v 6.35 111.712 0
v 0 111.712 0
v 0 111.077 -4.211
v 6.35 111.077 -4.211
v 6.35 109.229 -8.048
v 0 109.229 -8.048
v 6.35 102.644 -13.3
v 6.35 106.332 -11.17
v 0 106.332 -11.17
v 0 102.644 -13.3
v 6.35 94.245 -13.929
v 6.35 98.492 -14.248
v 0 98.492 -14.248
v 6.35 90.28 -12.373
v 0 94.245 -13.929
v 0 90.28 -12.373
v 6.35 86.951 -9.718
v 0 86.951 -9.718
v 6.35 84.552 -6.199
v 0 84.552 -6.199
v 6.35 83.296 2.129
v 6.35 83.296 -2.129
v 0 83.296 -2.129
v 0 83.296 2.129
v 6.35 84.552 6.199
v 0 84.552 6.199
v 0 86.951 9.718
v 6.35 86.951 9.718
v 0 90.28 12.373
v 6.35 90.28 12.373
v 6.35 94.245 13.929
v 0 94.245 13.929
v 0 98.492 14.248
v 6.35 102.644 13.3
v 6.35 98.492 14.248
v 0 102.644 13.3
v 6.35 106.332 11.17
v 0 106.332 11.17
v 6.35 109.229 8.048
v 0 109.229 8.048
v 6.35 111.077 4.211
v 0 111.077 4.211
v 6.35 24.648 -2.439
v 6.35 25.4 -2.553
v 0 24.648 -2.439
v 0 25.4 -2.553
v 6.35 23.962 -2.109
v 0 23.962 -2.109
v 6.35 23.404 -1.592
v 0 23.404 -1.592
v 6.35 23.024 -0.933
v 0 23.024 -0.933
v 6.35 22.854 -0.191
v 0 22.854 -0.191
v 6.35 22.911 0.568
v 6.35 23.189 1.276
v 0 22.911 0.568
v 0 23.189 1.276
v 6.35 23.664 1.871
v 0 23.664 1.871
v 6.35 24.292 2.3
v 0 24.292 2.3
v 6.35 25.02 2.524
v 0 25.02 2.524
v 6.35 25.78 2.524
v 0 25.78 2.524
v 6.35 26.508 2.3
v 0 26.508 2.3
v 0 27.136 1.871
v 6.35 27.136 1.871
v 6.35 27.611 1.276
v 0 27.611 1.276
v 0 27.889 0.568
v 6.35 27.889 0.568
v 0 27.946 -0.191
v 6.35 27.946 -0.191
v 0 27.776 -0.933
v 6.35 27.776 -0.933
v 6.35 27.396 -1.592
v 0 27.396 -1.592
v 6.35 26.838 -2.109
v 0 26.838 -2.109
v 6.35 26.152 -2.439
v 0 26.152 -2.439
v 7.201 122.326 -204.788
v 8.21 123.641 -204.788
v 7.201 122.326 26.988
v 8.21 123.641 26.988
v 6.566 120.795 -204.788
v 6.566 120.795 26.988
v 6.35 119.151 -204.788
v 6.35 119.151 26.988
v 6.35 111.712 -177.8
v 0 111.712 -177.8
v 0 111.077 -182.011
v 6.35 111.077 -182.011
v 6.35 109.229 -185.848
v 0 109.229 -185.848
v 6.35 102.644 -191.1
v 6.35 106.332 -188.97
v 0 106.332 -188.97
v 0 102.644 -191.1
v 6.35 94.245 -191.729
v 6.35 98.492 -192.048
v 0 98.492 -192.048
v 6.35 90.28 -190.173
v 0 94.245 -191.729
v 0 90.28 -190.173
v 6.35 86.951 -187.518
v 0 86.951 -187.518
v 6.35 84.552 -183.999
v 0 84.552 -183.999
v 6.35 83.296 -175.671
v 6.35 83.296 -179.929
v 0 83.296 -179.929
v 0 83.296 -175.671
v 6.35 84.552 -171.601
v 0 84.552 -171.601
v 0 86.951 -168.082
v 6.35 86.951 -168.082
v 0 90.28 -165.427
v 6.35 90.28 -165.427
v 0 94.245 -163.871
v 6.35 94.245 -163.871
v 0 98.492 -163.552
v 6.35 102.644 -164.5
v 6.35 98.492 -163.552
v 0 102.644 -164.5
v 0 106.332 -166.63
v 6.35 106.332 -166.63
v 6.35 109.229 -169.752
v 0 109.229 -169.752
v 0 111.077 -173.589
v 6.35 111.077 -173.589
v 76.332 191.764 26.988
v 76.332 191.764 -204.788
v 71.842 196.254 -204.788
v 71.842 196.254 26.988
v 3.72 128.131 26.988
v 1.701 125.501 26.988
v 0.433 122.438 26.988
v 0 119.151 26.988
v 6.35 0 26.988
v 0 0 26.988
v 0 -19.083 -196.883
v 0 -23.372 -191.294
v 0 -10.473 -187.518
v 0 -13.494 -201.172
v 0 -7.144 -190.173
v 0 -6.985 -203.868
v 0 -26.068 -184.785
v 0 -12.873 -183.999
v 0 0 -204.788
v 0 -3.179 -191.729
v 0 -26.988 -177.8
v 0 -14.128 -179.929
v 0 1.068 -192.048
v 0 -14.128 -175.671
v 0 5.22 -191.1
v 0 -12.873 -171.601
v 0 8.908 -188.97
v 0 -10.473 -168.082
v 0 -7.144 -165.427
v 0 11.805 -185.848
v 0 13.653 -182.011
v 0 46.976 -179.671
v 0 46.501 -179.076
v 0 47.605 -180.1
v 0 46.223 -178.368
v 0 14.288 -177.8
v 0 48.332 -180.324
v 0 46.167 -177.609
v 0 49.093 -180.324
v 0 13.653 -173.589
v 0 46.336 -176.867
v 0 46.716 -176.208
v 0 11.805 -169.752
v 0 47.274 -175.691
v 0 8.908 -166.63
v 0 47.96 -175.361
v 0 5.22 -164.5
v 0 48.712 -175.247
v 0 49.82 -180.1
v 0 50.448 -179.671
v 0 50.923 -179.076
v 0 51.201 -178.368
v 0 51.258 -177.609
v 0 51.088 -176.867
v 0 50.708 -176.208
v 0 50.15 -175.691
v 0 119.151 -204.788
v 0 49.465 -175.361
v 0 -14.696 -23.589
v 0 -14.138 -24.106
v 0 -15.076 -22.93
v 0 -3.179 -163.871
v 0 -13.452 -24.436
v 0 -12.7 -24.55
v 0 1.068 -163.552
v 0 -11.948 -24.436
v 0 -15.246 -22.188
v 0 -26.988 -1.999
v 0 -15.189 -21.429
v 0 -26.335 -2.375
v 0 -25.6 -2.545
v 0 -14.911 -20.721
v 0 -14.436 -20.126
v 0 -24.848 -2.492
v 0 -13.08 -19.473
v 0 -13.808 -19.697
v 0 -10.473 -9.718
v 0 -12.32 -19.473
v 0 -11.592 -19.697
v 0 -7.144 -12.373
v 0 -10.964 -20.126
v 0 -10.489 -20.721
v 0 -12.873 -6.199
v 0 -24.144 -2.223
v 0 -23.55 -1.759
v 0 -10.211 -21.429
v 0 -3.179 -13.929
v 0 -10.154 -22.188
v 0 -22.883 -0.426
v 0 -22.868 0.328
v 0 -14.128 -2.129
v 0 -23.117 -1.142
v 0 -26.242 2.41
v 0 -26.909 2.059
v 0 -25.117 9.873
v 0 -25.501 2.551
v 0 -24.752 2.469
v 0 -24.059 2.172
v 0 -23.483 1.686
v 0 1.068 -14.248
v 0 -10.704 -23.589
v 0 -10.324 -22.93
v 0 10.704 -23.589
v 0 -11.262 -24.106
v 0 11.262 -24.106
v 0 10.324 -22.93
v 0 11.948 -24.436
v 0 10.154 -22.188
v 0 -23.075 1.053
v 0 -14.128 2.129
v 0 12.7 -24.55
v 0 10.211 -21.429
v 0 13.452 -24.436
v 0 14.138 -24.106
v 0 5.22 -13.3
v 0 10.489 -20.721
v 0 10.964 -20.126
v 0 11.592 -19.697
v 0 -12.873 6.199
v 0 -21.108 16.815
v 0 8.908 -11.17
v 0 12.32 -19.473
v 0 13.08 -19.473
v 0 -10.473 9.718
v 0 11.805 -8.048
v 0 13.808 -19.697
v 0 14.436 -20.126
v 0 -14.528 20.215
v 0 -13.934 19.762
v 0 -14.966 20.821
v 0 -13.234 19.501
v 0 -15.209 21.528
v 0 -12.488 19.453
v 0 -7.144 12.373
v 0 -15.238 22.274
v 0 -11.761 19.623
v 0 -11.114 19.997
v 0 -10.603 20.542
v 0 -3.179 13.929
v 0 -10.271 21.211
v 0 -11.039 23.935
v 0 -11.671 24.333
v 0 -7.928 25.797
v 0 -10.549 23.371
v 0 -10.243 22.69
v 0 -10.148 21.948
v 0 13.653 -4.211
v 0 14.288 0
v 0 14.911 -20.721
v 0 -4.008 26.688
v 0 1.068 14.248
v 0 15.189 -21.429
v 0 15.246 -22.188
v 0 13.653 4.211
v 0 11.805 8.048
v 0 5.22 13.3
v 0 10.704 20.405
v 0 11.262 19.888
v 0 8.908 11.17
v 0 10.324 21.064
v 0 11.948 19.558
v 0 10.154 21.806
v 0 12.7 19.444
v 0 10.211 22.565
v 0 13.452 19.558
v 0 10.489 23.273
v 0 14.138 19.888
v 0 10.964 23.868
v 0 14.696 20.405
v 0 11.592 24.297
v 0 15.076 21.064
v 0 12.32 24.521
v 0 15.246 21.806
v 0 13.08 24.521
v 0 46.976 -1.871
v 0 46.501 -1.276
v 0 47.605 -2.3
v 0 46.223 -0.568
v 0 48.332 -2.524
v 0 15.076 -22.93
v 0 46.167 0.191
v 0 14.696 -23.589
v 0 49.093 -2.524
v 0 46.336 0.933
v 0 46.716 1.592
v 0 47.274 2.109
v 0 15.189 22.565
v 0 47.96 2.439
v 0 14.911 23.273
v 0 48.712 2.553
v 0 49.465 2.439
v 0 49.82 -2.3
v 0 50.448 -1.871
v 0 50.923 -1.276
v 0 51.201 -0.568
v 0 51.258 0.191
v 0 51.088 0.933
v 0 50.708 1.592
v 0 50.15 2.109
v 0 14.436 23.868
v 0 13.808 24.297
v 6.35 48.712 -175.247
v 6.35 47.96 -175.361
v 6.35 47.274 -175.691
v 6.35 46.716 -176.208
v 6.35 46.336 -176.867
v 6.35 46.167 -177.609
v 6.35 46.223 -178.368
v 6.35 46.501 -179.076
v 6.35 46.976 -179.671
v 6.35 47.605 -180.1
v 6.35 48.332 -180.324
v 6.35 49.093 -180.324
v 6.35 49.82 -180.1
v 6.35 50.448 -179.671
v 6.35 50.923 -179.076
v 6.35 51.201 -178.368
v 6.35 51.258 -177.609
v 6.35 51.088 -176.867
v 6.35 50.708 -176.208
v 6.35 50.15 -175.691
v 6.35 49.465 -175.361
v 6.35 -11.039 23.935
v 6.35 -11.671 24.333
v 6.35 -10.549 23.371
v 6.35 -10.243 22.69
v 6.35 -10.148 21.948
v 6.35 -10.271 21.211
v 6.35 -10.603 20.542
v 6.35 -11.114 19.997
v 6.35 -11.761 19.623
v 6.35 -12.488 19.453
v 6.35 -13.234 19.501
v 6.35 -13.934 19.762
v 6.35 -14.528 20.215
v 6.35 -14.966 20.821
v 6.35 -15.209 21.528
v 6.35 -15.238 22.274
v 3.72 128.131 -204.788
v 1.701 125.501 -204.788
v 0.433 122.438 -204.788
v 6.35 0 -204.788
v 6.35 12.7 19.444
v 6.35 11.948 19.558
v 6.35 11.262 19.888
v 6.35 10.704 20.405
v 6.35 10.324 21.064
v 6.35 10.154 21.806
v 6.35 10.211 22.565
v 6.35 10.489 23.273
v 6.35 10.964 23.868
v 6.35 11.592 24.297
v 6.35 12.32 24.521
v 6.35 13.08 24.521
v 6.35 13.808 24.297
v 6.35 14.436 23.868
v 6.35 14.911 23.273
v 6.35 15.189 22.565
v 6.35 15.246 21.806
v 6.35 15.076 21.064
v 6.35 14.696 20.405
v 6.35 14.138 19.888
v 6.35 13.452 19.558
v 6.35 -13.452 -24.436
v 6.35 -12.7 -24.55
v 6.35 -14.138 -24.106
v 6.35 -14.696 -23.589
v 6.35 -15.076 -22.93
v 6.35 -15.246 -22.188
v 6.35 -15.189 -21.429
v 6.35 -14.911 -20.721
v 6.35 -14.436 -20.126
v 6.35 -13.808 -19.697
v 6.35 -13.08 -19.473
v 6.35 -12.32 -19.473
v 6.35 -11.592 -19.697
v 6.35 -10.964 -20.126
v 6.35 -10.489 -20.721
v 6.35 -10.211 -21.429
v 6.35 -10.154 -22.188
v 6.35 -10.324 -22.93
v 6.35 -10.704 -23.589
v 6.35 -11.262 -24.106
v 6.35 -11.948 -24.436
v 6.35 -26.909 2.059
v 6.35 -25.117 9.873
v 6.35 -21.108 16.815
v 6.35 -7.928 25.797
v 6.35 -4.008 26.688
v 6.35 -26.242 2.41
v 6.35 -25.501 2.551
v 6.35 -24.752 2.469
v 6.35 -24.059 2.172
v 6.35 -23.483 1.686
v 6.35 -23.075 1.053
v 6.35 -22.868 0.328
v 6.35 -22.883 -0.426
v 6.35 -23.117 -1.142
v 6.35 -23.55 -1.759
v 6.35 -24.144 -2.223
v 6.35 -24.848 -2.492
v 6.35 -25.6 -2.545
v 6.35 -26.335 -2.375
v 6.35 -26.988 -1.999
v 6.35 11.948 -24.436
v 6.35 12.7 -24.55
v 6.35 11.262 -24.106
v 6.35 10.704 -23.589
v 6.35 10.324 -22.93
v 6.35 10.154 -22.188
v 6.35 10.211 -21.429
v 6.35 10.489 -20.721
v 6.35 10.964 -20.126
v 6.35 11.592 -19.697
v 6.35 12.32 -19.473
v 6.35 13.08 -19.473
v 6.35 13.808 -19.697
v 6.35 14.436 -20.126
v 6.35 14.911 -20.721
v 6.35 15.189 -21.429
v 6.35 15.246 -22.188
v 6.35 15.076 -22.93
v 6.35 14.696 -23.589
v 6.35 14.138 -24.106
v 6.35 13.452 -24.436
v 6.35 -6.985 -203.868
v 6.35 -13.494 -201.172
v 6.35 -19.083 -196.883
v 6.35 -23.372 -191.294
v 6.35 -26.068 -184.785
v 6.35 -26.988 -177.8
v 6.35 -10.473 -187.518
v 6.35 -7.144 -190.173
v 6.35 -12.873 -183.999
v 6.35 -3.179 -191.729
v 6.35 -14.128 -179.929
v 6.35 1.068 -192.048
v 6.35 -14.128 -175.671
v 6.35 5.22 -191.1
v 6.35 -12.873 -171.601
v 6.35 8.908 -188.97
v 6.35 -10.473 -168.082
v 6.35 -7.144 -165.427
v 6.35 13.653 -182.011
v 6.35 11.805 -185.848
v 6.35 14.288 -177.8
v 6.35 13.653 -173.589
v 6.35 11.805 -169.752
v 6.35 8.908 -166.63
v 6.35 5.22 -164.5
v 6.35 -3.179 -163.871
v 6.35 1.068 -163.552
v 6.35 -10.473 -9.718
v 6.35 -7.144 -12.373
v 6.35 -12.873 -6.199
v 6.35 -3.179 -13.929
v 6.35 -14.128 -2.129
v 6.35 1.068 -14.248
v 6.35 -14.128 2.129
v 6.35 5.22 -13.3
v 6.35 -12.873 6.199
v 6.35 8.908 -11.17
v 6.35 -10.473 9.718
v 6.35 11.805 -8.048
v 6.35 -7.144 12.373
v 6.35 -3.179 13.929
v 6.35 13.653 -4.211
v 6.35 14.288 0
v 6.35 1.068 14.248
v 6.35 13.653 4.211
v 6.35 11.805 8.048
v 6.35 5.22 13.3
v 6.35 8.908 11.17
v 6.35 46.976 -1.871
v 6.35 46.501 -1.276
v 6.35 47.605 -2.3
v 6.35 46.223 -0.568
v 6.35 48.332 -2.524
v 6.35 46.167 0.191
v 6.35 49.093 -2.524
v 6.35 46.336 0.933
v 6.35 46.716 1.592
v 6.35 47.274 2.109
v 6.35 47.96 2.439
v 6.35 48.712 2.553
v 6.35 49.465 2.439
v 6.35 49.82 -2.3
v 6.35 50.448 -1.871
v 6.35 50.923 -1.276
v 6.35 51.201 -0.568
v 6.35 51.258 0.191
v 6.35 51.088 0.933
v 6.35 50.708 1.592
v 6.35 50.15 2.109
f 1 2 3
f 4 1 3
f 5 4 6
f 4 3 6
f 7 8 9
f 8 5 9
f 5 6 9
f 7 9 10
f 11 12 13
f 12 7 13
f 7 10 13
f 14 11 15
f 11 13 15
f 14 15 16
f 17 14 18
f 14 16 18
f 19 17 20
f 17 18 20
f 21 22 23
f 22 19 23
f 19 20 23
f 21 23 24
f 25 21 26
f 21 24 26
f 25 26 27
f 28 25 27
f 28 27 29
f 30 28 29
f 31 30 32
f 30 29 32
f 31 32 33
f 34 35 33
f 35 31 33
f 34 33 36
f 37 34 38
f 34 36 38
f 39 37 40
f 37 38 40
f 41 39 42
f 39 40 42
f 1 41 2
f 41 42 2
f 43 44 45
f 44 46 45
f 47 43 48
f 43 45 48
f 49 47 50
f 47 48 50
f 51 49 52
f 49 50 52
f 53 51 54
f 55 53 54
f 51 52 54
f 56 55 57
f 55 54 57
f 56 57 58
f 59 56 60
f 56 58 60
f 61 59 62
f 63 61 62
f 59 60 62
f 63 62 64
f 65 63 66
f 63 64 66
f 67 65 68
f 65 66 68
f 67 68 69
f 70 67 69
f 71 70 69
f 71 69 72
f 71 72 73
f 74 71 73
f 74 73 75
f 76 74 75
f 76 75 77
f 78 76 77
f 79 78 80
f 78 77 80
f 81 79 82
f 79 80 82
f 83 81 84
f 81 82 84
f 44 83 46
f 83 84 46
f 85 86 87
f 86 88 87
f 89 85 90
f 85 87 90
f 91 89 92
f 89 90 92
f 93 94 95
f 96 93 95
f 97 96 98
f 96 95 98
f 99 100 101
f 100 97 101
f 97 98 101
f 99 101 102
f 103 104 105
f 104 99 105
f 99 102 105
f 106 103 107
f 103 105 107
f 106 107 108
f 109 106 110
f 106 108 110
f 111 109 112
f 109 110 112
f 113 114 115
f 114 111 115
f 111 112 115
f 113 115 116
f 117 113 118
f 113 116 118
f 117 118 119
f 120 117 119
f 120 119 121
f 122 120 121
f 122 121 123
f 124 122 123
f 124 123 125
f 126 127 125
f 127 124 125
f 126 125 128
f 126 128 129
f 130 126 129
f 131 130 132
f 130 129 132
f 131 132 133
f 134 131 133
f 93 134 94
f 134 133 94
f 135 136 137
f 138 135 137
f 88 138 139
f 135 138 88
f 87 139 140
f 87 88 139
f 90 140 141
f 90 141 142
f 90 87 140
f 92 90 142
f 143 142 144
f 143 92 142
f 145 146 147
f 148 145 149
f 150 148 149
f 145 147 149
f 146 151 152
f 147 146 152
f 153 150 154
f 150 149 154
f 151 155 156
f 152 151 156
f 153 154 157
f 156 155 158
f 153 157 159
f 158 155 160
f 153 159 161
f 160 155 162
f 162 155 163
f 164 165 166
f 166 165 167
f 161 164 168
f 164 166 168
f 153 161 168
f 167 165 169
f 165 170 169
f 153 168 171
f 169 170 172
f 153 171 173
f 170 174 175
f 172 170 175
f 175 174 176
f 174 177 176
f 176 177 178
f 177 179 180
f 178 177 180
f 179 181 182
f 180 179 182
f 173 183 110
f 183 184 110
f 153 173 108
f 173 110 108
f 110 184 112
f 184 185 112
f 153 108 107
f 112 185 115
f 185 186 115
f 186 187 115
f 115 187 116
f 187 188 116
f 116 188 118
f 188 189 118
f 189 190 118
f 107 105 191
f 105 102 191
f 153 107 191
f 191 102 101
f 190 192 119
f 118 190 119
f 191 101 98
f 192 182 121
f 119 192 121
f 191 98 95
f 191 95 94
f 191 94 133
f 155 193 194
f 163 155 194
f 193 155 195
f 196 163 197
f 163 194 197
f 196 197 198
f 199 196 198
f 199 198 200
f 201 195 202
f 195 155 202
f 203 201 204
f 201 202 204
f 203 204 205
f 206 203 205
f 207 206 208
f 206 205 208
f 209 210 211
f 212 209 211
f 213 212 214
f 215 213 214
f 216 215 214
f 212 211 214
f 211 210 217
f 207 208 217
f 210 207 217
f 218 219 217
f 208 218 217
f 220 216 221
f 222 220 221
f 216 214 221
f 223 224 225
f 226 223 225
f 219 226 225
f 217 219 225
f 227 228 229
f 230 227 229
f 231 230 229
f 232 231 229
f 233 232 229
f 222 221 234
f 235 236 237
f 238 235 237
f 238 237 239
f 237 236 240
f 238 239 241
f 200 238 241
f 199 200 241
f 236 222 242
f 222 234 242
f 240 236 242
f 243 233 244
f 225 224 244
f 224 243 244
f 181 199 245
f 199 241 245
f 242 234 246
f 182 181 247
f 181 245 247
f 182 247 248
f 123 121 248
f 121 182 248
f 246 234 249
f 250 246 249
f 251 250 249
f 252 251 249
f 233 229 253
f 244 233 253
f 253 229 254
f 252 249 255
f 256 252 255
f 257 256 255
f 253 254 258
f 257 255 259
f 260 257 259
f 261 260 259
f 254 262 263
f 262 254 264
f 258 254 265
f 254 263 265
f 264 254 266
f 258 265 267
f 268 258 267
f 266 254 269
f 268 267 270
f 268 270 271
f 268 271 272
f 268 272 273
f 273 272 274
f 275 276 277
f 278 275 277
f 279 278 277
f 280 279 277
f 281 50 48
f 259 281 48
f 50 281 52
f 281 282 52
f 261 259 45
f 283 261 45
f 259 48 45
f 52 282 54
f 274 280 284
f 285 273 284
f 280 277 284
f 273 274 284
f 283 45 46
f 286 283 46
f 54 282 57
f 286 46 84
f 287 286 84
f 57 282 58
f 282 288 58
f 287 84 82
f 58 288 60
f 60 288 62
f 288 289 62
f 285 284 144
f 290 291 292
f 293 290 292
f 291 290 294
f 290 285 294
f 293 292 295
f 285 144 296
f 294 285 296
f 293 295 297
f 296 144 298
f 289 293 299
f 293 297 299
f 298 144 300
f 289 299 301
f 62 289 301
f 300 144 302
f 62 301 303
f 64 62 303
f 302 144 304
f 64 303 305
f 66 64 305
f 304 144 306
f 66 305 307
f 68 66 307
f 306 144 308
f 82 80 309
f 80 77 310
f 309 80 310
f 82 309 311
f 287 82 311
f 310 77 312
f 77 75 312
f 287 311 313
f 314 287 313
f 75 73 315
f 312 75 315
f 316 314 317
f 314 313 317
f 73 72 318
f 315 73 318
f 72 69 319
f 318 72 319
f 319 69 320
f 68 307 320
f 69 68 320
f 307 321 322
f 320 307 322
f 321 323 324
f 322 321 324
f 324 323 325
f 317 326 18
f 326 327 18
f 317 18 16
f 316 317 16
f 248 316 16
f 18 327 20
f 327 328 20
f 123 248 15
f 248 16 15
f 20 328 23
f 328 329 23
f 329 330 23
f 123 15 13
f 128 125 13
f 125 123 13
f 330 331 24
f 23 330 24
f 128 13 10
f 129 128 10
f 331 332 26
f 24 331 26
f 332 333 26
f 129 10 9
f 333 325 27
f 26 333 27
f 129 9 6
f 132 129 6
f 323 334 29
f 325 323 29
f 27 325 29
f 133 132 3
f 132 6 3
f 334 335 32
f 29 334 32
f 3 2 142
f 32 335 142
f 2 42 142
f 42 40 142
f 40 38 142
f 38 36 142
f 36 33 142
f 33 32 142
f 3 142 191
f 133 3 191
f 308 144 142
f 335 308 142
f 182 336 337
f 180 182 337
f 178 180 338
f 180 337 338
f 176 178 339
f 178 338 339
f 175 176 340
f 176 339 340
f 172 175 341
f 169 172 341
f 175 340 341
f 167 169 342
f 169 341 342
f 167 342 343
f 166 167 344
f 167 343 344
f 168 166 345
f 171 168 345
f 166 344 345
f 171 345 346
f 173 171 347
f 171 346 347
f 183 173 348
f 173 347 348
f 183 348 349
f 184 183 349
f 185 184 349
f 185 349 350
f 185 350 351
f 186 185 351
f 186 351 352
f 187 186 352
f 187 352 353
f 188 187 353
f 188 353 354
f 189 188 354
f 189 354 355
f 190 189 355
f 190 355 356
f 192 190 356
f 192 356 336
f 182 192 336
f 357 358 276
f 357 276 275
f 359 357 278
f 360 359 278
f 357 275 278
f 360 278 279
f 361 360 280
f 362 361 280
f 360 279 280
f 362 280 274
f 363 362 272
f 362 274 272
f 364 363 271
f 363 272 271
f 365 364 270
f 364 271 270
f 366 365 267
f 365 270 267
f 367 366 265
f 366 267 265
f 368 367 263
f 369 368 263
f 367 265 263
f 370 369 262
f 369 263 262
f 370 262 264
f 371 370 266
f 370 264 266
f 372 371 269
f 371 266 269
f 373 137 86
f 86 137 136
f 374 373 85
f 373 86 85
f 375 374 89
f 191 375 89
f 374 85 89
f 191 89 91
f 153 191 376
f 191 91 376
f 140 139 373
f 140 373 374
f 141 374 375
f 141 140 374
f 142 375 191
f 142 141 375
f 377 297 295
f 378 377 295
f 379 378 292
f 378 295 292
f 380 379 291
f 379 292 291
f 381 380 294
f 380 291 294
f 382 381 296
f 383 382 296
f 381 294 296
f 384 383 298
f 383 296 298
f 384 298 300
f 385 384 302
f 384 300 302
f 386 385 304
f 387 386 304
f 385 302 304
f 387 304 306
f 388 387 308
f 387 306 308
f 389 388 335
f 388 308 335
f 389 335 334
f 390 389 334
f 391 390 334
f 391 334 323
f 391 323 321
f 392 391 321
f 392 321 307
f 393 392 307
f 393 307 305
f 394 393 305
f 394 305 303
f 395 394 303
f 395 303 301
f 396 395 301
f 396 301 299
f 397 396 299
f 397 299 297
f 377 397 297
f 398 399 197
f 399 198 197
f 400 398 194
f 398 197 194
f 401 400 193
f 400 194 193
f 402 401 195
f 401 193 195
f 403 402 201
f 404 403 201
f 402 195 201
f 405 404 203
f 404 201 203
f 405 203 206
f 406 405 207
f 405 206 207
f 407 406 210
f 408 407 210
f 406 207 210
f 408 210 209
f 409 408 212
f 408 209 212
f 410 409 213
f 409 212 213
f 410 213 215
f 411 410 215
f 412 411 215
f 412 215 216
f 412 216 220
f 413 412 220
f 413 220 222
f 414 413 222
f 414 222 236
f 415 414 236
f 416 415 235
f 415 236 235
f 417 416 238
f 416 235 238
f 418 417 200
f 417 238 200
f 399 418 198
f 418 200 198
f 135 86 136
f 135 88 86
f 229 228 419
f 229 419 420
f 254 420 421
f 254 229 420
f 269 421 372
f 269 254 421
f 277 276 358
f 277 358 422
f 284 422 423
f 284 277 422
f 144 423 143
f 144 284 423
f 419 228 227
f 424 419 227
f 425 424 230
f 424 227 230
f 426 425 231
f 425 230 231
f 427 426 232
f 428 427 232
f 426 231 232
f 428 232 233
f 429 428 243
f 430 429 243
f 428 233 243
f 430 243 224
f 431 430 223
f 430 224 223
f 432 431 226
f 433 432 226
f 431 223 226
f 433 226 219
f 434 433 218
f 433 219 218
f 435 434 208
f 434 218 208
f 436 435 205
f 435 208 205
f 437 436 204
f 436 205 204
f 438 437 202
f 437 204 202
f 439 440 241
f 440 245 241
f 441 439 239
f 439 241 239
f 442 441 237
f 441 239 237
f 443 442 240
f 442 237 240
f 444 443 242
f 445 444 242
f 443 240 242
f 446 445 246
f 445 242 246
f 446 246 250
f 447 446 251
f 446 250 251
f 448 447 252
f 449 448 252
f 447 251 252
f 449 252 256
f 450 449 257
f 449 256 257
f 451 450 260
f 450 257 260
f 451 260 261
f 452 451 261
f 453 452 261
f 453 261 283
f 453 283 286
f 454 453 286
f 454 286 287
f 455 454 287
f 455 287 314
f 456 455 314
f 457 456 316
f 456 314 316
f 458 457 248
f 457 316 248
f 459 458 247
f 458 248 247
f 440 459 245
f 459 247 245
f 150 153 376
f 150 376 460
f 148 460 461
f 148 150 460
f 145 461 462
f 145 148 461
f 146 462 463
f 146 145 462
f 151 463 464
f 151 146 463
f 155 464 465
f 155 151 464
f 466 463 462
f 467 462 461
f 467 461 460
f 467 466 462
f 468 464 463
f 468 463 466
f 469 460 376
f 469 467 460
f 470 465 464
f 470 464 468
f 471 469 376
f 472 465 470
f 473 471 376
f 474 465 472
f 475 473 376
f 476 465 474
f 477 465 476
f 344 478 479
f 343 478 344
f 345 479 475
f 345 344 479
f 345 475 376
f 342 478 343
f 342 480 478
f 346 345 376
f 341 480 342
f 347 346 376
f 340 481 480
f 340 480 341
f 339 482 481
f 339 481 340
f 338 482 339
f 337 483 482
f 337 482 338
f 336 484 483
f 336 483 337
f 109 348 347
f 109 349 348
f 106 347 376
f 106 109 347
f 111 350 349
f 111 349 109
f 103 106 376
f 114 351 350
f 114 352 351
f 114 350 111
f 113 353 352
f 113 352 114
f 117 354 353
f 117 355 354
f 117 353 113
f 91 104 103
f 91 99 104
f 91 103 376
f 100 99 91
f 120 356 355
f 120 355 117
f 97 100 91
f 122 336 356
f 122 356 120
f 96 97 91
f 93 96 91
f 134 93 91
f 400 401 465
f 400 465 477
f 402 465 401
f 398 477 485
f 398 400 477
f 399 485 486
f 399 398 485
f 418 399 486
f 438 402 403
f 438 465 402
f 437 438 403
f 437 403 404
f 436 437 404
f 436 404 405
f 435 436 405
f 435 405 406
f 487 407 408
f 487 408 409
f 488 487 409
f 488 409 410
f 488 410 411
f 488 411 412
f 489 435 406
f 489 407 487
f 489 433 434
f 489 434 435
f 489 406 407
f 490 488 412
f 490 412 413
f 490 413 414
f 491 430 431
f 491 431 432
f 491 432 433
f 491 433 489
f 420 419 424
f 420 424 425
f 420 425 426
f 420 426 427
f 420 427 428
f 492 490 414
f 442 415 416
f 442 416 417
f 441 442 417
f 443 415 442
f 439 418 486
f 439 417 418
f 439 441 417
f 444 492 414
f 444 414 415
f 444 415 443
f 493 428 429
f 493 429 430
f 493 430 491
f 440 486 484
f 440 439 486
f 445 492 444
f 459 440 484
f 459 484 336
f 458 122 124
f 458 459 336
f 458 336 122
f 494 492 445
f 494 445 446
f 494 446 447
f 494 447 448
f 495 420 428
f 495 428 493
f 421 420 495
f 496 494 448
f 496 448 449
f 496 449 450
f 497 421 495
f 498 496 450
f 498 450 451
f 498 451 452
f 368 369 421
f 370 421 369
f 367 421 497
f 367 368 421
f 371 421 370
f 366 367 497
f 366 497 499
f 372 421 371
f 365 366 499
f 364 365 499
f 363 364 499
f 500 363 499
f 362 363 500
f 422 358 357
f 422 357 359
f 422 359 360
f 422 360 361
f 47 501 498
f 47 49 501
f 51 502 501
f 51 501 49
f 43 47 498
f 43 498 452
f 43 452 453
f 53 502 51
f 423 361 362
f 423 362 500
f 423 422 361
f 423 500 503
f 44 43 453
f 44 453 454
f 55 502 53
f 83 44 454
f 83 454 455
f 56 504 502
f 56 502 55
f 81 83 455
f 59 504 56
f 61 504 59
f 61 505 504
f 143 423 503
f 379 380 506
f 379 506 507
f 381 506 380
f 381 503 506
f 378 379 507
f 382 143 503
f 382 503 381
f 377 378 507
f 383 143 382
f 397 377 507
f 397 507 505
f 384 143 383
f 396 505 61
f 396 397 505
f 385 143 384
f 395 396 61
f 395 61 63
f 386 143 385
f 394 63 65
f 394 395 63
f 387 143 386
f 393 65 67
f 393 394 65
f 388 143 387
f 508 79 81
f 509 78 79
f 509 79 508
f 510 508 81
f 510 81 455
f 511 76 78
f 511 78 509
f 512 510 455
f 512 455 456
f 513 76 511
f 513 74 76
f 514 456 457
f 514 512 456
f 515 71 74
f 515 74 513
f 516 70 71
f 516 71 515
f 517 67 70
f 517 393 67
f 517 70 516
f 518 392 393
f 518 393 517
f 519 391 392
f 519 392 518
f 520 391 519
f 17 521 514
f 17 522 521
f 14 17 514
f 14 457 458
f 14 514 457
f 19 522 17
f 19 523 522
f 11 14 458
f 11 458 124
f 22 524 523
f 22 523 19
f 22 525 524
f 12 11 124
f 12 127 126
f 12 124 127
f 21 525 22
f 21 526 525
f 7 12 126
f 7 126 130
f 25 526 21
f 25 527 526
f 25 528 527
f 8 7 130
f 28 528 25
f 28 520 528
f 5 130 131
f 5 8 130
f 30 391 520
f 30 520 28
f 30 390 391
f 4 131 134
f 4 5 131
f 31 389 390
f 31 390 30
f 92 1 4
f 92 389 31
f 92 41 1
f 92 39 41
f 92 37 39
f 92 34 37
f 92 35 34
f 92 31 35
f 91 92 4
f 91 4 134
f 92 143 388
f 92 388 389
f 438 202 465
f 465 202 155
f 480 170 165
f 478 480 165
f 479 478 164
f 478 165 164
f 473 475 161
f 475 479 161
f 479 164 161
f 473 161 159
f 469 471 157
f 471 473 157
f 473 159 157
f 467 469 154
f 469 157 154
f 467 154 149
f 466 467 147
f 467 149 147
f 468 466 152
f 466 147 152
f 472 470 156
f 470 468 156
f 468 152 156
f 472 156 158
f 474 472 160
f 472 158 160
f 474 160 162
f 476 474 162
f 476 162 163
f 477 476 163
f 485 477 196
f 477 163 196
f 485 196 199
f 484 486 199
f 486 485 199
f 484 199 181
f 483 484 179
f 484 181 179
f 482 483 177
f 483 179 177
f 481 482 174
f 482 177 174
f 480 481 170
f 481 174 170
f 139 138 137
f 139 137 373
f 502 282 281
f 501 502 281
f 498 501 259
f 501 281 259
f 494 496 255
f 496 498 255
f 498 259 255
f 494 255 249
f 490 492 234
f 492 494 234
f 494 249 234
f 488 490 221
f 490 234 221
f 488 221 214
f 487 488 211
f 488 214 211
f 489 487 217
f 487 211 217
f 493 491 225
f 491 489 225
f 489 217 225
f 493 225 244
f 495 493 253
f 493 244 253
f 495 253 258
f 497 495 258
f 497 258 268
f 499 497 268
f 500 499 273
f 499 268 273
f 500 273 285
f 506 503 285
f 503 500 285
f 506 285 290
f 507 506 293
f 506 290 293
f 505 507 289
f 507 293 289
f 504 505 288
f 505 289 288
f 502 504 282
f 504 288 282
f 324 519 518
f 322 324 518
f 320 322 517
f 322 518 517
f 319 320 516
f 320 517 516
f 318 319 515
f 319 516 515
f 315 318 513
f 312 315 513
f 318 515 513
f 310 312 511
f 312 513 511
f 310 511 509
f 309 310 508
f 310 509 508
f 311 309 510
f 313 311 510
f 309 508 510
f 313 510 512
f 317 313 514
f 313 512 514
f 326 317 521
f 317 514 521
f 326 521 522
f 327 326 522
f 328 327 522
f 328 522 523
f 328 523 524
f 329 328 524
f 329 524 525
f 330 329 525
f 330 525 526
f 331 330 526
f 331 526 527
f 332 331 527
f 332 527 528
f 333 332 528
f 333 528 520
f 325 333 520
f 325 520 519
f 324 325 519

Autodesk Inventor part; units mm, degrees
ref_plane "YZ Plane" through (0, 0, 0) normal (1, 0, 0) x (0, 1, 0)
ref_plane "XZ Plane" through (0, 0, 0) normal (0, 1, 0) x (-1, 0, 0)
ref_plane "XY Plane" through (0, 0, 0) normal (0, 0, 1) x (1, 0, 0)
sketch "Sketch1" plane through (0, 0, 0) normal (1, 0, 0) x (0, 1, 0)
  circle A0 centre (0, 0) radius 14.2875
  circle A1 centre (0, -177.8) radius 14.2875
  line L0 (152.4, -31.75) -> (-152.4, -31.75) construction
  line L1 (-152.4, -31.75) -> (-152.4, -146.05) construction
  line L2 (-152.4, -146.05) -> (152.4, -146.05) construction
  line L3 (152.4, -146.05) -> (152.4, -31.75) construction
  line L4 (152.4, -31.75) -> (-152.4, -146.05) construction
  line L5 (-152.4, -31.75) -> (152.4, -146.05) construction
  circle A2 centre (0, 0) radius 38.1 construction
  circle A3 centre (0, -177.8) radius 38.1 construction
  circle A4 centre (0, 0) radius 31.75 construction
  circle A5 centre (0, -177.8) radius 31.75 construction
  circle A6 centre (0, 0) radius 26.9875 construction
  circle A7 centre (0, -177.8) radius 26.9875 construction
  circle A8 centre (97.4242, -177.8) radius 14.2875
  circle A9 centre (97.4242, -177.8) radius 38.1 construction
  circle A10 centre (97.4242, -177.8) radius 31.75 construction
  circle A11 centre (97.4242, -177.8) radius 26.9875 construction
  circle A12 centre (97.4242, 0) radius 14.2875
  circle A13 centre (97.4242, 0) radius 38.1 construction
  circle A14 centre (97.4242, 0) radius 31.75 construction
  circle A15 centre (97.4242, 0) radius 26.9875 construction
  line L6 (124.4117, -204.7875) -> (0, -204.7875)
  line L7 (124.4117, 26.9875) -> (0, 26.9875)
  line L8 (124.4117, 26.9875) -> (124.4117, -204.7875)
  line L9 (-26.9875, 0) -> (-26.9875, -177.8)
  arc A16 (0, 26.9875) -> (-26.9875, 0) centre (0, 0) ccw
  arc A17 (-26.9875, -177.8) -> (0, -204.7875) centre (0, -177.8) ccw
  line L10 (97.4242, -177.8) -> (0, -177.8) construction
  point P0 (0, -88.9)
  point P1 (97.4242, -204.7875)
  point P2 (124.4117, 0)
  point P3 (48.7121, 0)
  point P4 (48.7121, -177.8)
  point P5 (48.7121, -177.8)
  dimension "d0" = 28.575
  dimension "d2" = 304.8
  dimension "d3" = 114.3
  dimension "d4" = 76.2
  dimension "d6" = 6.35
  dimension "d7" = 12.7
  dimension "d8" = 97.4242
extrude "Extrusion1" add sketch "Sketch1" along normal blind 6.35
hole "Hole1" at (0, 48.7121, 0) at (0, 48.7121, -177.8) direction (1, 0, 0) diameter 5.1054 end through all clearance for "Flat Head Machine Screw (82)" size "#10" standard "Ansi Unified Screw Threads"
sketch "Sketch2" plane through (4.4901, 119.9216, 26.9875) normal (-0.7071068, 0.7071068, 0) x (-0.7071068, -0.7071068, 0)
  line L0 (0, -231.775) -> (0, 0)
  line L1 (0, 0) -> (-101.6, 0)
  line L2 (-101.6, 0) -> (-101.6, -231.775)
  line L3 (-101.6, -231.775) -> (0, -231.775)
edge flange "Flange1" height 101.6 angle 45 thickness 6.35 bend radius 6.35 thickness toward (-0.7071068, 0.7071068, 0) relief tear relief width 6.35 relief depth 3.175 edges at (6.35, 124.4117, -88.9) wall of the first edge with corners at (4.4901, 119.9216, -204.7875) (4.4901, 119.9216, 26.9875) (76.3322, 191.7637, 26.9875) (76.3322, 191.7637, -204.7875)
bend "Bend1"
corner "Corner1"
sketch "Sketch4" plane through (6.35, 0, 0) normal (1, 0, 0) x (0, 0, -1)
  circle A0 centre (0, 0) radius 14.2875 construction
  circle A1 centre (0, 0) radius 25.4 construction
  point P0 (0, 25.4)
  point P1 (-21.997, 12.7)
  point P2 (-21.997, -12.7)
  point P3 (0, -25.4)
  point P4 (21.997, -12.7)
  point P5 (21.997, 12.7)
  dimension "d38" = 50.8
  dimension "d41" = 360
hole "Hole3" at (6.35, 25.4, 0) at (6.35, 12.7, 21.997) at (6.35, -12.7, 21.997) at (6.35, -25.4, 0) at (6.35, -12.7, -21.997) at (6.35, 12.7, -21.997) direction (-1, 0, 0) diameter 5.1054 end through all clearance for "Flat Head Machine Screw (82)" size "#10" standard "Ansi Unified Screw Threads"
equation "\"d48\" = Thickness"
equation "\"d18\" = Thickness"
equation "\"d19\" = BendReliefWidth"
equation "\"d20\" = BendReliefDepth"
equation "\"d21\" = MinimumRemnant"
equation "\"d22\" = TransitionRadius"
equation "\"d25\" = BendRadius"
equation "\"d26\" = CornerReliefSize"
equation "\"d27\" = GapSize"
equation "\"d28\" = JacobiRadiusSize"
equation "\"BendRadius\" = Thickness"
equation "\"BendReliefWidth\" = Thickness"
equation "\"BendReliefDepth\" = 0.5 * Thickness"
equation "\"CornerReliefSize\" = 4 * Thickness"
equation "\"MinimumRemnant\" = 2 * Thickness"
equation "\"TransitionRadius\" = BendRadius"
equation "\"JacobiRadiusSize\" = BendRadius"
equation "\"GapSize\" = Thickness"
equation "\"Thickness\" = 6.35"
properties part number "GP4-005" material "Polycarbonate, Smoke"
